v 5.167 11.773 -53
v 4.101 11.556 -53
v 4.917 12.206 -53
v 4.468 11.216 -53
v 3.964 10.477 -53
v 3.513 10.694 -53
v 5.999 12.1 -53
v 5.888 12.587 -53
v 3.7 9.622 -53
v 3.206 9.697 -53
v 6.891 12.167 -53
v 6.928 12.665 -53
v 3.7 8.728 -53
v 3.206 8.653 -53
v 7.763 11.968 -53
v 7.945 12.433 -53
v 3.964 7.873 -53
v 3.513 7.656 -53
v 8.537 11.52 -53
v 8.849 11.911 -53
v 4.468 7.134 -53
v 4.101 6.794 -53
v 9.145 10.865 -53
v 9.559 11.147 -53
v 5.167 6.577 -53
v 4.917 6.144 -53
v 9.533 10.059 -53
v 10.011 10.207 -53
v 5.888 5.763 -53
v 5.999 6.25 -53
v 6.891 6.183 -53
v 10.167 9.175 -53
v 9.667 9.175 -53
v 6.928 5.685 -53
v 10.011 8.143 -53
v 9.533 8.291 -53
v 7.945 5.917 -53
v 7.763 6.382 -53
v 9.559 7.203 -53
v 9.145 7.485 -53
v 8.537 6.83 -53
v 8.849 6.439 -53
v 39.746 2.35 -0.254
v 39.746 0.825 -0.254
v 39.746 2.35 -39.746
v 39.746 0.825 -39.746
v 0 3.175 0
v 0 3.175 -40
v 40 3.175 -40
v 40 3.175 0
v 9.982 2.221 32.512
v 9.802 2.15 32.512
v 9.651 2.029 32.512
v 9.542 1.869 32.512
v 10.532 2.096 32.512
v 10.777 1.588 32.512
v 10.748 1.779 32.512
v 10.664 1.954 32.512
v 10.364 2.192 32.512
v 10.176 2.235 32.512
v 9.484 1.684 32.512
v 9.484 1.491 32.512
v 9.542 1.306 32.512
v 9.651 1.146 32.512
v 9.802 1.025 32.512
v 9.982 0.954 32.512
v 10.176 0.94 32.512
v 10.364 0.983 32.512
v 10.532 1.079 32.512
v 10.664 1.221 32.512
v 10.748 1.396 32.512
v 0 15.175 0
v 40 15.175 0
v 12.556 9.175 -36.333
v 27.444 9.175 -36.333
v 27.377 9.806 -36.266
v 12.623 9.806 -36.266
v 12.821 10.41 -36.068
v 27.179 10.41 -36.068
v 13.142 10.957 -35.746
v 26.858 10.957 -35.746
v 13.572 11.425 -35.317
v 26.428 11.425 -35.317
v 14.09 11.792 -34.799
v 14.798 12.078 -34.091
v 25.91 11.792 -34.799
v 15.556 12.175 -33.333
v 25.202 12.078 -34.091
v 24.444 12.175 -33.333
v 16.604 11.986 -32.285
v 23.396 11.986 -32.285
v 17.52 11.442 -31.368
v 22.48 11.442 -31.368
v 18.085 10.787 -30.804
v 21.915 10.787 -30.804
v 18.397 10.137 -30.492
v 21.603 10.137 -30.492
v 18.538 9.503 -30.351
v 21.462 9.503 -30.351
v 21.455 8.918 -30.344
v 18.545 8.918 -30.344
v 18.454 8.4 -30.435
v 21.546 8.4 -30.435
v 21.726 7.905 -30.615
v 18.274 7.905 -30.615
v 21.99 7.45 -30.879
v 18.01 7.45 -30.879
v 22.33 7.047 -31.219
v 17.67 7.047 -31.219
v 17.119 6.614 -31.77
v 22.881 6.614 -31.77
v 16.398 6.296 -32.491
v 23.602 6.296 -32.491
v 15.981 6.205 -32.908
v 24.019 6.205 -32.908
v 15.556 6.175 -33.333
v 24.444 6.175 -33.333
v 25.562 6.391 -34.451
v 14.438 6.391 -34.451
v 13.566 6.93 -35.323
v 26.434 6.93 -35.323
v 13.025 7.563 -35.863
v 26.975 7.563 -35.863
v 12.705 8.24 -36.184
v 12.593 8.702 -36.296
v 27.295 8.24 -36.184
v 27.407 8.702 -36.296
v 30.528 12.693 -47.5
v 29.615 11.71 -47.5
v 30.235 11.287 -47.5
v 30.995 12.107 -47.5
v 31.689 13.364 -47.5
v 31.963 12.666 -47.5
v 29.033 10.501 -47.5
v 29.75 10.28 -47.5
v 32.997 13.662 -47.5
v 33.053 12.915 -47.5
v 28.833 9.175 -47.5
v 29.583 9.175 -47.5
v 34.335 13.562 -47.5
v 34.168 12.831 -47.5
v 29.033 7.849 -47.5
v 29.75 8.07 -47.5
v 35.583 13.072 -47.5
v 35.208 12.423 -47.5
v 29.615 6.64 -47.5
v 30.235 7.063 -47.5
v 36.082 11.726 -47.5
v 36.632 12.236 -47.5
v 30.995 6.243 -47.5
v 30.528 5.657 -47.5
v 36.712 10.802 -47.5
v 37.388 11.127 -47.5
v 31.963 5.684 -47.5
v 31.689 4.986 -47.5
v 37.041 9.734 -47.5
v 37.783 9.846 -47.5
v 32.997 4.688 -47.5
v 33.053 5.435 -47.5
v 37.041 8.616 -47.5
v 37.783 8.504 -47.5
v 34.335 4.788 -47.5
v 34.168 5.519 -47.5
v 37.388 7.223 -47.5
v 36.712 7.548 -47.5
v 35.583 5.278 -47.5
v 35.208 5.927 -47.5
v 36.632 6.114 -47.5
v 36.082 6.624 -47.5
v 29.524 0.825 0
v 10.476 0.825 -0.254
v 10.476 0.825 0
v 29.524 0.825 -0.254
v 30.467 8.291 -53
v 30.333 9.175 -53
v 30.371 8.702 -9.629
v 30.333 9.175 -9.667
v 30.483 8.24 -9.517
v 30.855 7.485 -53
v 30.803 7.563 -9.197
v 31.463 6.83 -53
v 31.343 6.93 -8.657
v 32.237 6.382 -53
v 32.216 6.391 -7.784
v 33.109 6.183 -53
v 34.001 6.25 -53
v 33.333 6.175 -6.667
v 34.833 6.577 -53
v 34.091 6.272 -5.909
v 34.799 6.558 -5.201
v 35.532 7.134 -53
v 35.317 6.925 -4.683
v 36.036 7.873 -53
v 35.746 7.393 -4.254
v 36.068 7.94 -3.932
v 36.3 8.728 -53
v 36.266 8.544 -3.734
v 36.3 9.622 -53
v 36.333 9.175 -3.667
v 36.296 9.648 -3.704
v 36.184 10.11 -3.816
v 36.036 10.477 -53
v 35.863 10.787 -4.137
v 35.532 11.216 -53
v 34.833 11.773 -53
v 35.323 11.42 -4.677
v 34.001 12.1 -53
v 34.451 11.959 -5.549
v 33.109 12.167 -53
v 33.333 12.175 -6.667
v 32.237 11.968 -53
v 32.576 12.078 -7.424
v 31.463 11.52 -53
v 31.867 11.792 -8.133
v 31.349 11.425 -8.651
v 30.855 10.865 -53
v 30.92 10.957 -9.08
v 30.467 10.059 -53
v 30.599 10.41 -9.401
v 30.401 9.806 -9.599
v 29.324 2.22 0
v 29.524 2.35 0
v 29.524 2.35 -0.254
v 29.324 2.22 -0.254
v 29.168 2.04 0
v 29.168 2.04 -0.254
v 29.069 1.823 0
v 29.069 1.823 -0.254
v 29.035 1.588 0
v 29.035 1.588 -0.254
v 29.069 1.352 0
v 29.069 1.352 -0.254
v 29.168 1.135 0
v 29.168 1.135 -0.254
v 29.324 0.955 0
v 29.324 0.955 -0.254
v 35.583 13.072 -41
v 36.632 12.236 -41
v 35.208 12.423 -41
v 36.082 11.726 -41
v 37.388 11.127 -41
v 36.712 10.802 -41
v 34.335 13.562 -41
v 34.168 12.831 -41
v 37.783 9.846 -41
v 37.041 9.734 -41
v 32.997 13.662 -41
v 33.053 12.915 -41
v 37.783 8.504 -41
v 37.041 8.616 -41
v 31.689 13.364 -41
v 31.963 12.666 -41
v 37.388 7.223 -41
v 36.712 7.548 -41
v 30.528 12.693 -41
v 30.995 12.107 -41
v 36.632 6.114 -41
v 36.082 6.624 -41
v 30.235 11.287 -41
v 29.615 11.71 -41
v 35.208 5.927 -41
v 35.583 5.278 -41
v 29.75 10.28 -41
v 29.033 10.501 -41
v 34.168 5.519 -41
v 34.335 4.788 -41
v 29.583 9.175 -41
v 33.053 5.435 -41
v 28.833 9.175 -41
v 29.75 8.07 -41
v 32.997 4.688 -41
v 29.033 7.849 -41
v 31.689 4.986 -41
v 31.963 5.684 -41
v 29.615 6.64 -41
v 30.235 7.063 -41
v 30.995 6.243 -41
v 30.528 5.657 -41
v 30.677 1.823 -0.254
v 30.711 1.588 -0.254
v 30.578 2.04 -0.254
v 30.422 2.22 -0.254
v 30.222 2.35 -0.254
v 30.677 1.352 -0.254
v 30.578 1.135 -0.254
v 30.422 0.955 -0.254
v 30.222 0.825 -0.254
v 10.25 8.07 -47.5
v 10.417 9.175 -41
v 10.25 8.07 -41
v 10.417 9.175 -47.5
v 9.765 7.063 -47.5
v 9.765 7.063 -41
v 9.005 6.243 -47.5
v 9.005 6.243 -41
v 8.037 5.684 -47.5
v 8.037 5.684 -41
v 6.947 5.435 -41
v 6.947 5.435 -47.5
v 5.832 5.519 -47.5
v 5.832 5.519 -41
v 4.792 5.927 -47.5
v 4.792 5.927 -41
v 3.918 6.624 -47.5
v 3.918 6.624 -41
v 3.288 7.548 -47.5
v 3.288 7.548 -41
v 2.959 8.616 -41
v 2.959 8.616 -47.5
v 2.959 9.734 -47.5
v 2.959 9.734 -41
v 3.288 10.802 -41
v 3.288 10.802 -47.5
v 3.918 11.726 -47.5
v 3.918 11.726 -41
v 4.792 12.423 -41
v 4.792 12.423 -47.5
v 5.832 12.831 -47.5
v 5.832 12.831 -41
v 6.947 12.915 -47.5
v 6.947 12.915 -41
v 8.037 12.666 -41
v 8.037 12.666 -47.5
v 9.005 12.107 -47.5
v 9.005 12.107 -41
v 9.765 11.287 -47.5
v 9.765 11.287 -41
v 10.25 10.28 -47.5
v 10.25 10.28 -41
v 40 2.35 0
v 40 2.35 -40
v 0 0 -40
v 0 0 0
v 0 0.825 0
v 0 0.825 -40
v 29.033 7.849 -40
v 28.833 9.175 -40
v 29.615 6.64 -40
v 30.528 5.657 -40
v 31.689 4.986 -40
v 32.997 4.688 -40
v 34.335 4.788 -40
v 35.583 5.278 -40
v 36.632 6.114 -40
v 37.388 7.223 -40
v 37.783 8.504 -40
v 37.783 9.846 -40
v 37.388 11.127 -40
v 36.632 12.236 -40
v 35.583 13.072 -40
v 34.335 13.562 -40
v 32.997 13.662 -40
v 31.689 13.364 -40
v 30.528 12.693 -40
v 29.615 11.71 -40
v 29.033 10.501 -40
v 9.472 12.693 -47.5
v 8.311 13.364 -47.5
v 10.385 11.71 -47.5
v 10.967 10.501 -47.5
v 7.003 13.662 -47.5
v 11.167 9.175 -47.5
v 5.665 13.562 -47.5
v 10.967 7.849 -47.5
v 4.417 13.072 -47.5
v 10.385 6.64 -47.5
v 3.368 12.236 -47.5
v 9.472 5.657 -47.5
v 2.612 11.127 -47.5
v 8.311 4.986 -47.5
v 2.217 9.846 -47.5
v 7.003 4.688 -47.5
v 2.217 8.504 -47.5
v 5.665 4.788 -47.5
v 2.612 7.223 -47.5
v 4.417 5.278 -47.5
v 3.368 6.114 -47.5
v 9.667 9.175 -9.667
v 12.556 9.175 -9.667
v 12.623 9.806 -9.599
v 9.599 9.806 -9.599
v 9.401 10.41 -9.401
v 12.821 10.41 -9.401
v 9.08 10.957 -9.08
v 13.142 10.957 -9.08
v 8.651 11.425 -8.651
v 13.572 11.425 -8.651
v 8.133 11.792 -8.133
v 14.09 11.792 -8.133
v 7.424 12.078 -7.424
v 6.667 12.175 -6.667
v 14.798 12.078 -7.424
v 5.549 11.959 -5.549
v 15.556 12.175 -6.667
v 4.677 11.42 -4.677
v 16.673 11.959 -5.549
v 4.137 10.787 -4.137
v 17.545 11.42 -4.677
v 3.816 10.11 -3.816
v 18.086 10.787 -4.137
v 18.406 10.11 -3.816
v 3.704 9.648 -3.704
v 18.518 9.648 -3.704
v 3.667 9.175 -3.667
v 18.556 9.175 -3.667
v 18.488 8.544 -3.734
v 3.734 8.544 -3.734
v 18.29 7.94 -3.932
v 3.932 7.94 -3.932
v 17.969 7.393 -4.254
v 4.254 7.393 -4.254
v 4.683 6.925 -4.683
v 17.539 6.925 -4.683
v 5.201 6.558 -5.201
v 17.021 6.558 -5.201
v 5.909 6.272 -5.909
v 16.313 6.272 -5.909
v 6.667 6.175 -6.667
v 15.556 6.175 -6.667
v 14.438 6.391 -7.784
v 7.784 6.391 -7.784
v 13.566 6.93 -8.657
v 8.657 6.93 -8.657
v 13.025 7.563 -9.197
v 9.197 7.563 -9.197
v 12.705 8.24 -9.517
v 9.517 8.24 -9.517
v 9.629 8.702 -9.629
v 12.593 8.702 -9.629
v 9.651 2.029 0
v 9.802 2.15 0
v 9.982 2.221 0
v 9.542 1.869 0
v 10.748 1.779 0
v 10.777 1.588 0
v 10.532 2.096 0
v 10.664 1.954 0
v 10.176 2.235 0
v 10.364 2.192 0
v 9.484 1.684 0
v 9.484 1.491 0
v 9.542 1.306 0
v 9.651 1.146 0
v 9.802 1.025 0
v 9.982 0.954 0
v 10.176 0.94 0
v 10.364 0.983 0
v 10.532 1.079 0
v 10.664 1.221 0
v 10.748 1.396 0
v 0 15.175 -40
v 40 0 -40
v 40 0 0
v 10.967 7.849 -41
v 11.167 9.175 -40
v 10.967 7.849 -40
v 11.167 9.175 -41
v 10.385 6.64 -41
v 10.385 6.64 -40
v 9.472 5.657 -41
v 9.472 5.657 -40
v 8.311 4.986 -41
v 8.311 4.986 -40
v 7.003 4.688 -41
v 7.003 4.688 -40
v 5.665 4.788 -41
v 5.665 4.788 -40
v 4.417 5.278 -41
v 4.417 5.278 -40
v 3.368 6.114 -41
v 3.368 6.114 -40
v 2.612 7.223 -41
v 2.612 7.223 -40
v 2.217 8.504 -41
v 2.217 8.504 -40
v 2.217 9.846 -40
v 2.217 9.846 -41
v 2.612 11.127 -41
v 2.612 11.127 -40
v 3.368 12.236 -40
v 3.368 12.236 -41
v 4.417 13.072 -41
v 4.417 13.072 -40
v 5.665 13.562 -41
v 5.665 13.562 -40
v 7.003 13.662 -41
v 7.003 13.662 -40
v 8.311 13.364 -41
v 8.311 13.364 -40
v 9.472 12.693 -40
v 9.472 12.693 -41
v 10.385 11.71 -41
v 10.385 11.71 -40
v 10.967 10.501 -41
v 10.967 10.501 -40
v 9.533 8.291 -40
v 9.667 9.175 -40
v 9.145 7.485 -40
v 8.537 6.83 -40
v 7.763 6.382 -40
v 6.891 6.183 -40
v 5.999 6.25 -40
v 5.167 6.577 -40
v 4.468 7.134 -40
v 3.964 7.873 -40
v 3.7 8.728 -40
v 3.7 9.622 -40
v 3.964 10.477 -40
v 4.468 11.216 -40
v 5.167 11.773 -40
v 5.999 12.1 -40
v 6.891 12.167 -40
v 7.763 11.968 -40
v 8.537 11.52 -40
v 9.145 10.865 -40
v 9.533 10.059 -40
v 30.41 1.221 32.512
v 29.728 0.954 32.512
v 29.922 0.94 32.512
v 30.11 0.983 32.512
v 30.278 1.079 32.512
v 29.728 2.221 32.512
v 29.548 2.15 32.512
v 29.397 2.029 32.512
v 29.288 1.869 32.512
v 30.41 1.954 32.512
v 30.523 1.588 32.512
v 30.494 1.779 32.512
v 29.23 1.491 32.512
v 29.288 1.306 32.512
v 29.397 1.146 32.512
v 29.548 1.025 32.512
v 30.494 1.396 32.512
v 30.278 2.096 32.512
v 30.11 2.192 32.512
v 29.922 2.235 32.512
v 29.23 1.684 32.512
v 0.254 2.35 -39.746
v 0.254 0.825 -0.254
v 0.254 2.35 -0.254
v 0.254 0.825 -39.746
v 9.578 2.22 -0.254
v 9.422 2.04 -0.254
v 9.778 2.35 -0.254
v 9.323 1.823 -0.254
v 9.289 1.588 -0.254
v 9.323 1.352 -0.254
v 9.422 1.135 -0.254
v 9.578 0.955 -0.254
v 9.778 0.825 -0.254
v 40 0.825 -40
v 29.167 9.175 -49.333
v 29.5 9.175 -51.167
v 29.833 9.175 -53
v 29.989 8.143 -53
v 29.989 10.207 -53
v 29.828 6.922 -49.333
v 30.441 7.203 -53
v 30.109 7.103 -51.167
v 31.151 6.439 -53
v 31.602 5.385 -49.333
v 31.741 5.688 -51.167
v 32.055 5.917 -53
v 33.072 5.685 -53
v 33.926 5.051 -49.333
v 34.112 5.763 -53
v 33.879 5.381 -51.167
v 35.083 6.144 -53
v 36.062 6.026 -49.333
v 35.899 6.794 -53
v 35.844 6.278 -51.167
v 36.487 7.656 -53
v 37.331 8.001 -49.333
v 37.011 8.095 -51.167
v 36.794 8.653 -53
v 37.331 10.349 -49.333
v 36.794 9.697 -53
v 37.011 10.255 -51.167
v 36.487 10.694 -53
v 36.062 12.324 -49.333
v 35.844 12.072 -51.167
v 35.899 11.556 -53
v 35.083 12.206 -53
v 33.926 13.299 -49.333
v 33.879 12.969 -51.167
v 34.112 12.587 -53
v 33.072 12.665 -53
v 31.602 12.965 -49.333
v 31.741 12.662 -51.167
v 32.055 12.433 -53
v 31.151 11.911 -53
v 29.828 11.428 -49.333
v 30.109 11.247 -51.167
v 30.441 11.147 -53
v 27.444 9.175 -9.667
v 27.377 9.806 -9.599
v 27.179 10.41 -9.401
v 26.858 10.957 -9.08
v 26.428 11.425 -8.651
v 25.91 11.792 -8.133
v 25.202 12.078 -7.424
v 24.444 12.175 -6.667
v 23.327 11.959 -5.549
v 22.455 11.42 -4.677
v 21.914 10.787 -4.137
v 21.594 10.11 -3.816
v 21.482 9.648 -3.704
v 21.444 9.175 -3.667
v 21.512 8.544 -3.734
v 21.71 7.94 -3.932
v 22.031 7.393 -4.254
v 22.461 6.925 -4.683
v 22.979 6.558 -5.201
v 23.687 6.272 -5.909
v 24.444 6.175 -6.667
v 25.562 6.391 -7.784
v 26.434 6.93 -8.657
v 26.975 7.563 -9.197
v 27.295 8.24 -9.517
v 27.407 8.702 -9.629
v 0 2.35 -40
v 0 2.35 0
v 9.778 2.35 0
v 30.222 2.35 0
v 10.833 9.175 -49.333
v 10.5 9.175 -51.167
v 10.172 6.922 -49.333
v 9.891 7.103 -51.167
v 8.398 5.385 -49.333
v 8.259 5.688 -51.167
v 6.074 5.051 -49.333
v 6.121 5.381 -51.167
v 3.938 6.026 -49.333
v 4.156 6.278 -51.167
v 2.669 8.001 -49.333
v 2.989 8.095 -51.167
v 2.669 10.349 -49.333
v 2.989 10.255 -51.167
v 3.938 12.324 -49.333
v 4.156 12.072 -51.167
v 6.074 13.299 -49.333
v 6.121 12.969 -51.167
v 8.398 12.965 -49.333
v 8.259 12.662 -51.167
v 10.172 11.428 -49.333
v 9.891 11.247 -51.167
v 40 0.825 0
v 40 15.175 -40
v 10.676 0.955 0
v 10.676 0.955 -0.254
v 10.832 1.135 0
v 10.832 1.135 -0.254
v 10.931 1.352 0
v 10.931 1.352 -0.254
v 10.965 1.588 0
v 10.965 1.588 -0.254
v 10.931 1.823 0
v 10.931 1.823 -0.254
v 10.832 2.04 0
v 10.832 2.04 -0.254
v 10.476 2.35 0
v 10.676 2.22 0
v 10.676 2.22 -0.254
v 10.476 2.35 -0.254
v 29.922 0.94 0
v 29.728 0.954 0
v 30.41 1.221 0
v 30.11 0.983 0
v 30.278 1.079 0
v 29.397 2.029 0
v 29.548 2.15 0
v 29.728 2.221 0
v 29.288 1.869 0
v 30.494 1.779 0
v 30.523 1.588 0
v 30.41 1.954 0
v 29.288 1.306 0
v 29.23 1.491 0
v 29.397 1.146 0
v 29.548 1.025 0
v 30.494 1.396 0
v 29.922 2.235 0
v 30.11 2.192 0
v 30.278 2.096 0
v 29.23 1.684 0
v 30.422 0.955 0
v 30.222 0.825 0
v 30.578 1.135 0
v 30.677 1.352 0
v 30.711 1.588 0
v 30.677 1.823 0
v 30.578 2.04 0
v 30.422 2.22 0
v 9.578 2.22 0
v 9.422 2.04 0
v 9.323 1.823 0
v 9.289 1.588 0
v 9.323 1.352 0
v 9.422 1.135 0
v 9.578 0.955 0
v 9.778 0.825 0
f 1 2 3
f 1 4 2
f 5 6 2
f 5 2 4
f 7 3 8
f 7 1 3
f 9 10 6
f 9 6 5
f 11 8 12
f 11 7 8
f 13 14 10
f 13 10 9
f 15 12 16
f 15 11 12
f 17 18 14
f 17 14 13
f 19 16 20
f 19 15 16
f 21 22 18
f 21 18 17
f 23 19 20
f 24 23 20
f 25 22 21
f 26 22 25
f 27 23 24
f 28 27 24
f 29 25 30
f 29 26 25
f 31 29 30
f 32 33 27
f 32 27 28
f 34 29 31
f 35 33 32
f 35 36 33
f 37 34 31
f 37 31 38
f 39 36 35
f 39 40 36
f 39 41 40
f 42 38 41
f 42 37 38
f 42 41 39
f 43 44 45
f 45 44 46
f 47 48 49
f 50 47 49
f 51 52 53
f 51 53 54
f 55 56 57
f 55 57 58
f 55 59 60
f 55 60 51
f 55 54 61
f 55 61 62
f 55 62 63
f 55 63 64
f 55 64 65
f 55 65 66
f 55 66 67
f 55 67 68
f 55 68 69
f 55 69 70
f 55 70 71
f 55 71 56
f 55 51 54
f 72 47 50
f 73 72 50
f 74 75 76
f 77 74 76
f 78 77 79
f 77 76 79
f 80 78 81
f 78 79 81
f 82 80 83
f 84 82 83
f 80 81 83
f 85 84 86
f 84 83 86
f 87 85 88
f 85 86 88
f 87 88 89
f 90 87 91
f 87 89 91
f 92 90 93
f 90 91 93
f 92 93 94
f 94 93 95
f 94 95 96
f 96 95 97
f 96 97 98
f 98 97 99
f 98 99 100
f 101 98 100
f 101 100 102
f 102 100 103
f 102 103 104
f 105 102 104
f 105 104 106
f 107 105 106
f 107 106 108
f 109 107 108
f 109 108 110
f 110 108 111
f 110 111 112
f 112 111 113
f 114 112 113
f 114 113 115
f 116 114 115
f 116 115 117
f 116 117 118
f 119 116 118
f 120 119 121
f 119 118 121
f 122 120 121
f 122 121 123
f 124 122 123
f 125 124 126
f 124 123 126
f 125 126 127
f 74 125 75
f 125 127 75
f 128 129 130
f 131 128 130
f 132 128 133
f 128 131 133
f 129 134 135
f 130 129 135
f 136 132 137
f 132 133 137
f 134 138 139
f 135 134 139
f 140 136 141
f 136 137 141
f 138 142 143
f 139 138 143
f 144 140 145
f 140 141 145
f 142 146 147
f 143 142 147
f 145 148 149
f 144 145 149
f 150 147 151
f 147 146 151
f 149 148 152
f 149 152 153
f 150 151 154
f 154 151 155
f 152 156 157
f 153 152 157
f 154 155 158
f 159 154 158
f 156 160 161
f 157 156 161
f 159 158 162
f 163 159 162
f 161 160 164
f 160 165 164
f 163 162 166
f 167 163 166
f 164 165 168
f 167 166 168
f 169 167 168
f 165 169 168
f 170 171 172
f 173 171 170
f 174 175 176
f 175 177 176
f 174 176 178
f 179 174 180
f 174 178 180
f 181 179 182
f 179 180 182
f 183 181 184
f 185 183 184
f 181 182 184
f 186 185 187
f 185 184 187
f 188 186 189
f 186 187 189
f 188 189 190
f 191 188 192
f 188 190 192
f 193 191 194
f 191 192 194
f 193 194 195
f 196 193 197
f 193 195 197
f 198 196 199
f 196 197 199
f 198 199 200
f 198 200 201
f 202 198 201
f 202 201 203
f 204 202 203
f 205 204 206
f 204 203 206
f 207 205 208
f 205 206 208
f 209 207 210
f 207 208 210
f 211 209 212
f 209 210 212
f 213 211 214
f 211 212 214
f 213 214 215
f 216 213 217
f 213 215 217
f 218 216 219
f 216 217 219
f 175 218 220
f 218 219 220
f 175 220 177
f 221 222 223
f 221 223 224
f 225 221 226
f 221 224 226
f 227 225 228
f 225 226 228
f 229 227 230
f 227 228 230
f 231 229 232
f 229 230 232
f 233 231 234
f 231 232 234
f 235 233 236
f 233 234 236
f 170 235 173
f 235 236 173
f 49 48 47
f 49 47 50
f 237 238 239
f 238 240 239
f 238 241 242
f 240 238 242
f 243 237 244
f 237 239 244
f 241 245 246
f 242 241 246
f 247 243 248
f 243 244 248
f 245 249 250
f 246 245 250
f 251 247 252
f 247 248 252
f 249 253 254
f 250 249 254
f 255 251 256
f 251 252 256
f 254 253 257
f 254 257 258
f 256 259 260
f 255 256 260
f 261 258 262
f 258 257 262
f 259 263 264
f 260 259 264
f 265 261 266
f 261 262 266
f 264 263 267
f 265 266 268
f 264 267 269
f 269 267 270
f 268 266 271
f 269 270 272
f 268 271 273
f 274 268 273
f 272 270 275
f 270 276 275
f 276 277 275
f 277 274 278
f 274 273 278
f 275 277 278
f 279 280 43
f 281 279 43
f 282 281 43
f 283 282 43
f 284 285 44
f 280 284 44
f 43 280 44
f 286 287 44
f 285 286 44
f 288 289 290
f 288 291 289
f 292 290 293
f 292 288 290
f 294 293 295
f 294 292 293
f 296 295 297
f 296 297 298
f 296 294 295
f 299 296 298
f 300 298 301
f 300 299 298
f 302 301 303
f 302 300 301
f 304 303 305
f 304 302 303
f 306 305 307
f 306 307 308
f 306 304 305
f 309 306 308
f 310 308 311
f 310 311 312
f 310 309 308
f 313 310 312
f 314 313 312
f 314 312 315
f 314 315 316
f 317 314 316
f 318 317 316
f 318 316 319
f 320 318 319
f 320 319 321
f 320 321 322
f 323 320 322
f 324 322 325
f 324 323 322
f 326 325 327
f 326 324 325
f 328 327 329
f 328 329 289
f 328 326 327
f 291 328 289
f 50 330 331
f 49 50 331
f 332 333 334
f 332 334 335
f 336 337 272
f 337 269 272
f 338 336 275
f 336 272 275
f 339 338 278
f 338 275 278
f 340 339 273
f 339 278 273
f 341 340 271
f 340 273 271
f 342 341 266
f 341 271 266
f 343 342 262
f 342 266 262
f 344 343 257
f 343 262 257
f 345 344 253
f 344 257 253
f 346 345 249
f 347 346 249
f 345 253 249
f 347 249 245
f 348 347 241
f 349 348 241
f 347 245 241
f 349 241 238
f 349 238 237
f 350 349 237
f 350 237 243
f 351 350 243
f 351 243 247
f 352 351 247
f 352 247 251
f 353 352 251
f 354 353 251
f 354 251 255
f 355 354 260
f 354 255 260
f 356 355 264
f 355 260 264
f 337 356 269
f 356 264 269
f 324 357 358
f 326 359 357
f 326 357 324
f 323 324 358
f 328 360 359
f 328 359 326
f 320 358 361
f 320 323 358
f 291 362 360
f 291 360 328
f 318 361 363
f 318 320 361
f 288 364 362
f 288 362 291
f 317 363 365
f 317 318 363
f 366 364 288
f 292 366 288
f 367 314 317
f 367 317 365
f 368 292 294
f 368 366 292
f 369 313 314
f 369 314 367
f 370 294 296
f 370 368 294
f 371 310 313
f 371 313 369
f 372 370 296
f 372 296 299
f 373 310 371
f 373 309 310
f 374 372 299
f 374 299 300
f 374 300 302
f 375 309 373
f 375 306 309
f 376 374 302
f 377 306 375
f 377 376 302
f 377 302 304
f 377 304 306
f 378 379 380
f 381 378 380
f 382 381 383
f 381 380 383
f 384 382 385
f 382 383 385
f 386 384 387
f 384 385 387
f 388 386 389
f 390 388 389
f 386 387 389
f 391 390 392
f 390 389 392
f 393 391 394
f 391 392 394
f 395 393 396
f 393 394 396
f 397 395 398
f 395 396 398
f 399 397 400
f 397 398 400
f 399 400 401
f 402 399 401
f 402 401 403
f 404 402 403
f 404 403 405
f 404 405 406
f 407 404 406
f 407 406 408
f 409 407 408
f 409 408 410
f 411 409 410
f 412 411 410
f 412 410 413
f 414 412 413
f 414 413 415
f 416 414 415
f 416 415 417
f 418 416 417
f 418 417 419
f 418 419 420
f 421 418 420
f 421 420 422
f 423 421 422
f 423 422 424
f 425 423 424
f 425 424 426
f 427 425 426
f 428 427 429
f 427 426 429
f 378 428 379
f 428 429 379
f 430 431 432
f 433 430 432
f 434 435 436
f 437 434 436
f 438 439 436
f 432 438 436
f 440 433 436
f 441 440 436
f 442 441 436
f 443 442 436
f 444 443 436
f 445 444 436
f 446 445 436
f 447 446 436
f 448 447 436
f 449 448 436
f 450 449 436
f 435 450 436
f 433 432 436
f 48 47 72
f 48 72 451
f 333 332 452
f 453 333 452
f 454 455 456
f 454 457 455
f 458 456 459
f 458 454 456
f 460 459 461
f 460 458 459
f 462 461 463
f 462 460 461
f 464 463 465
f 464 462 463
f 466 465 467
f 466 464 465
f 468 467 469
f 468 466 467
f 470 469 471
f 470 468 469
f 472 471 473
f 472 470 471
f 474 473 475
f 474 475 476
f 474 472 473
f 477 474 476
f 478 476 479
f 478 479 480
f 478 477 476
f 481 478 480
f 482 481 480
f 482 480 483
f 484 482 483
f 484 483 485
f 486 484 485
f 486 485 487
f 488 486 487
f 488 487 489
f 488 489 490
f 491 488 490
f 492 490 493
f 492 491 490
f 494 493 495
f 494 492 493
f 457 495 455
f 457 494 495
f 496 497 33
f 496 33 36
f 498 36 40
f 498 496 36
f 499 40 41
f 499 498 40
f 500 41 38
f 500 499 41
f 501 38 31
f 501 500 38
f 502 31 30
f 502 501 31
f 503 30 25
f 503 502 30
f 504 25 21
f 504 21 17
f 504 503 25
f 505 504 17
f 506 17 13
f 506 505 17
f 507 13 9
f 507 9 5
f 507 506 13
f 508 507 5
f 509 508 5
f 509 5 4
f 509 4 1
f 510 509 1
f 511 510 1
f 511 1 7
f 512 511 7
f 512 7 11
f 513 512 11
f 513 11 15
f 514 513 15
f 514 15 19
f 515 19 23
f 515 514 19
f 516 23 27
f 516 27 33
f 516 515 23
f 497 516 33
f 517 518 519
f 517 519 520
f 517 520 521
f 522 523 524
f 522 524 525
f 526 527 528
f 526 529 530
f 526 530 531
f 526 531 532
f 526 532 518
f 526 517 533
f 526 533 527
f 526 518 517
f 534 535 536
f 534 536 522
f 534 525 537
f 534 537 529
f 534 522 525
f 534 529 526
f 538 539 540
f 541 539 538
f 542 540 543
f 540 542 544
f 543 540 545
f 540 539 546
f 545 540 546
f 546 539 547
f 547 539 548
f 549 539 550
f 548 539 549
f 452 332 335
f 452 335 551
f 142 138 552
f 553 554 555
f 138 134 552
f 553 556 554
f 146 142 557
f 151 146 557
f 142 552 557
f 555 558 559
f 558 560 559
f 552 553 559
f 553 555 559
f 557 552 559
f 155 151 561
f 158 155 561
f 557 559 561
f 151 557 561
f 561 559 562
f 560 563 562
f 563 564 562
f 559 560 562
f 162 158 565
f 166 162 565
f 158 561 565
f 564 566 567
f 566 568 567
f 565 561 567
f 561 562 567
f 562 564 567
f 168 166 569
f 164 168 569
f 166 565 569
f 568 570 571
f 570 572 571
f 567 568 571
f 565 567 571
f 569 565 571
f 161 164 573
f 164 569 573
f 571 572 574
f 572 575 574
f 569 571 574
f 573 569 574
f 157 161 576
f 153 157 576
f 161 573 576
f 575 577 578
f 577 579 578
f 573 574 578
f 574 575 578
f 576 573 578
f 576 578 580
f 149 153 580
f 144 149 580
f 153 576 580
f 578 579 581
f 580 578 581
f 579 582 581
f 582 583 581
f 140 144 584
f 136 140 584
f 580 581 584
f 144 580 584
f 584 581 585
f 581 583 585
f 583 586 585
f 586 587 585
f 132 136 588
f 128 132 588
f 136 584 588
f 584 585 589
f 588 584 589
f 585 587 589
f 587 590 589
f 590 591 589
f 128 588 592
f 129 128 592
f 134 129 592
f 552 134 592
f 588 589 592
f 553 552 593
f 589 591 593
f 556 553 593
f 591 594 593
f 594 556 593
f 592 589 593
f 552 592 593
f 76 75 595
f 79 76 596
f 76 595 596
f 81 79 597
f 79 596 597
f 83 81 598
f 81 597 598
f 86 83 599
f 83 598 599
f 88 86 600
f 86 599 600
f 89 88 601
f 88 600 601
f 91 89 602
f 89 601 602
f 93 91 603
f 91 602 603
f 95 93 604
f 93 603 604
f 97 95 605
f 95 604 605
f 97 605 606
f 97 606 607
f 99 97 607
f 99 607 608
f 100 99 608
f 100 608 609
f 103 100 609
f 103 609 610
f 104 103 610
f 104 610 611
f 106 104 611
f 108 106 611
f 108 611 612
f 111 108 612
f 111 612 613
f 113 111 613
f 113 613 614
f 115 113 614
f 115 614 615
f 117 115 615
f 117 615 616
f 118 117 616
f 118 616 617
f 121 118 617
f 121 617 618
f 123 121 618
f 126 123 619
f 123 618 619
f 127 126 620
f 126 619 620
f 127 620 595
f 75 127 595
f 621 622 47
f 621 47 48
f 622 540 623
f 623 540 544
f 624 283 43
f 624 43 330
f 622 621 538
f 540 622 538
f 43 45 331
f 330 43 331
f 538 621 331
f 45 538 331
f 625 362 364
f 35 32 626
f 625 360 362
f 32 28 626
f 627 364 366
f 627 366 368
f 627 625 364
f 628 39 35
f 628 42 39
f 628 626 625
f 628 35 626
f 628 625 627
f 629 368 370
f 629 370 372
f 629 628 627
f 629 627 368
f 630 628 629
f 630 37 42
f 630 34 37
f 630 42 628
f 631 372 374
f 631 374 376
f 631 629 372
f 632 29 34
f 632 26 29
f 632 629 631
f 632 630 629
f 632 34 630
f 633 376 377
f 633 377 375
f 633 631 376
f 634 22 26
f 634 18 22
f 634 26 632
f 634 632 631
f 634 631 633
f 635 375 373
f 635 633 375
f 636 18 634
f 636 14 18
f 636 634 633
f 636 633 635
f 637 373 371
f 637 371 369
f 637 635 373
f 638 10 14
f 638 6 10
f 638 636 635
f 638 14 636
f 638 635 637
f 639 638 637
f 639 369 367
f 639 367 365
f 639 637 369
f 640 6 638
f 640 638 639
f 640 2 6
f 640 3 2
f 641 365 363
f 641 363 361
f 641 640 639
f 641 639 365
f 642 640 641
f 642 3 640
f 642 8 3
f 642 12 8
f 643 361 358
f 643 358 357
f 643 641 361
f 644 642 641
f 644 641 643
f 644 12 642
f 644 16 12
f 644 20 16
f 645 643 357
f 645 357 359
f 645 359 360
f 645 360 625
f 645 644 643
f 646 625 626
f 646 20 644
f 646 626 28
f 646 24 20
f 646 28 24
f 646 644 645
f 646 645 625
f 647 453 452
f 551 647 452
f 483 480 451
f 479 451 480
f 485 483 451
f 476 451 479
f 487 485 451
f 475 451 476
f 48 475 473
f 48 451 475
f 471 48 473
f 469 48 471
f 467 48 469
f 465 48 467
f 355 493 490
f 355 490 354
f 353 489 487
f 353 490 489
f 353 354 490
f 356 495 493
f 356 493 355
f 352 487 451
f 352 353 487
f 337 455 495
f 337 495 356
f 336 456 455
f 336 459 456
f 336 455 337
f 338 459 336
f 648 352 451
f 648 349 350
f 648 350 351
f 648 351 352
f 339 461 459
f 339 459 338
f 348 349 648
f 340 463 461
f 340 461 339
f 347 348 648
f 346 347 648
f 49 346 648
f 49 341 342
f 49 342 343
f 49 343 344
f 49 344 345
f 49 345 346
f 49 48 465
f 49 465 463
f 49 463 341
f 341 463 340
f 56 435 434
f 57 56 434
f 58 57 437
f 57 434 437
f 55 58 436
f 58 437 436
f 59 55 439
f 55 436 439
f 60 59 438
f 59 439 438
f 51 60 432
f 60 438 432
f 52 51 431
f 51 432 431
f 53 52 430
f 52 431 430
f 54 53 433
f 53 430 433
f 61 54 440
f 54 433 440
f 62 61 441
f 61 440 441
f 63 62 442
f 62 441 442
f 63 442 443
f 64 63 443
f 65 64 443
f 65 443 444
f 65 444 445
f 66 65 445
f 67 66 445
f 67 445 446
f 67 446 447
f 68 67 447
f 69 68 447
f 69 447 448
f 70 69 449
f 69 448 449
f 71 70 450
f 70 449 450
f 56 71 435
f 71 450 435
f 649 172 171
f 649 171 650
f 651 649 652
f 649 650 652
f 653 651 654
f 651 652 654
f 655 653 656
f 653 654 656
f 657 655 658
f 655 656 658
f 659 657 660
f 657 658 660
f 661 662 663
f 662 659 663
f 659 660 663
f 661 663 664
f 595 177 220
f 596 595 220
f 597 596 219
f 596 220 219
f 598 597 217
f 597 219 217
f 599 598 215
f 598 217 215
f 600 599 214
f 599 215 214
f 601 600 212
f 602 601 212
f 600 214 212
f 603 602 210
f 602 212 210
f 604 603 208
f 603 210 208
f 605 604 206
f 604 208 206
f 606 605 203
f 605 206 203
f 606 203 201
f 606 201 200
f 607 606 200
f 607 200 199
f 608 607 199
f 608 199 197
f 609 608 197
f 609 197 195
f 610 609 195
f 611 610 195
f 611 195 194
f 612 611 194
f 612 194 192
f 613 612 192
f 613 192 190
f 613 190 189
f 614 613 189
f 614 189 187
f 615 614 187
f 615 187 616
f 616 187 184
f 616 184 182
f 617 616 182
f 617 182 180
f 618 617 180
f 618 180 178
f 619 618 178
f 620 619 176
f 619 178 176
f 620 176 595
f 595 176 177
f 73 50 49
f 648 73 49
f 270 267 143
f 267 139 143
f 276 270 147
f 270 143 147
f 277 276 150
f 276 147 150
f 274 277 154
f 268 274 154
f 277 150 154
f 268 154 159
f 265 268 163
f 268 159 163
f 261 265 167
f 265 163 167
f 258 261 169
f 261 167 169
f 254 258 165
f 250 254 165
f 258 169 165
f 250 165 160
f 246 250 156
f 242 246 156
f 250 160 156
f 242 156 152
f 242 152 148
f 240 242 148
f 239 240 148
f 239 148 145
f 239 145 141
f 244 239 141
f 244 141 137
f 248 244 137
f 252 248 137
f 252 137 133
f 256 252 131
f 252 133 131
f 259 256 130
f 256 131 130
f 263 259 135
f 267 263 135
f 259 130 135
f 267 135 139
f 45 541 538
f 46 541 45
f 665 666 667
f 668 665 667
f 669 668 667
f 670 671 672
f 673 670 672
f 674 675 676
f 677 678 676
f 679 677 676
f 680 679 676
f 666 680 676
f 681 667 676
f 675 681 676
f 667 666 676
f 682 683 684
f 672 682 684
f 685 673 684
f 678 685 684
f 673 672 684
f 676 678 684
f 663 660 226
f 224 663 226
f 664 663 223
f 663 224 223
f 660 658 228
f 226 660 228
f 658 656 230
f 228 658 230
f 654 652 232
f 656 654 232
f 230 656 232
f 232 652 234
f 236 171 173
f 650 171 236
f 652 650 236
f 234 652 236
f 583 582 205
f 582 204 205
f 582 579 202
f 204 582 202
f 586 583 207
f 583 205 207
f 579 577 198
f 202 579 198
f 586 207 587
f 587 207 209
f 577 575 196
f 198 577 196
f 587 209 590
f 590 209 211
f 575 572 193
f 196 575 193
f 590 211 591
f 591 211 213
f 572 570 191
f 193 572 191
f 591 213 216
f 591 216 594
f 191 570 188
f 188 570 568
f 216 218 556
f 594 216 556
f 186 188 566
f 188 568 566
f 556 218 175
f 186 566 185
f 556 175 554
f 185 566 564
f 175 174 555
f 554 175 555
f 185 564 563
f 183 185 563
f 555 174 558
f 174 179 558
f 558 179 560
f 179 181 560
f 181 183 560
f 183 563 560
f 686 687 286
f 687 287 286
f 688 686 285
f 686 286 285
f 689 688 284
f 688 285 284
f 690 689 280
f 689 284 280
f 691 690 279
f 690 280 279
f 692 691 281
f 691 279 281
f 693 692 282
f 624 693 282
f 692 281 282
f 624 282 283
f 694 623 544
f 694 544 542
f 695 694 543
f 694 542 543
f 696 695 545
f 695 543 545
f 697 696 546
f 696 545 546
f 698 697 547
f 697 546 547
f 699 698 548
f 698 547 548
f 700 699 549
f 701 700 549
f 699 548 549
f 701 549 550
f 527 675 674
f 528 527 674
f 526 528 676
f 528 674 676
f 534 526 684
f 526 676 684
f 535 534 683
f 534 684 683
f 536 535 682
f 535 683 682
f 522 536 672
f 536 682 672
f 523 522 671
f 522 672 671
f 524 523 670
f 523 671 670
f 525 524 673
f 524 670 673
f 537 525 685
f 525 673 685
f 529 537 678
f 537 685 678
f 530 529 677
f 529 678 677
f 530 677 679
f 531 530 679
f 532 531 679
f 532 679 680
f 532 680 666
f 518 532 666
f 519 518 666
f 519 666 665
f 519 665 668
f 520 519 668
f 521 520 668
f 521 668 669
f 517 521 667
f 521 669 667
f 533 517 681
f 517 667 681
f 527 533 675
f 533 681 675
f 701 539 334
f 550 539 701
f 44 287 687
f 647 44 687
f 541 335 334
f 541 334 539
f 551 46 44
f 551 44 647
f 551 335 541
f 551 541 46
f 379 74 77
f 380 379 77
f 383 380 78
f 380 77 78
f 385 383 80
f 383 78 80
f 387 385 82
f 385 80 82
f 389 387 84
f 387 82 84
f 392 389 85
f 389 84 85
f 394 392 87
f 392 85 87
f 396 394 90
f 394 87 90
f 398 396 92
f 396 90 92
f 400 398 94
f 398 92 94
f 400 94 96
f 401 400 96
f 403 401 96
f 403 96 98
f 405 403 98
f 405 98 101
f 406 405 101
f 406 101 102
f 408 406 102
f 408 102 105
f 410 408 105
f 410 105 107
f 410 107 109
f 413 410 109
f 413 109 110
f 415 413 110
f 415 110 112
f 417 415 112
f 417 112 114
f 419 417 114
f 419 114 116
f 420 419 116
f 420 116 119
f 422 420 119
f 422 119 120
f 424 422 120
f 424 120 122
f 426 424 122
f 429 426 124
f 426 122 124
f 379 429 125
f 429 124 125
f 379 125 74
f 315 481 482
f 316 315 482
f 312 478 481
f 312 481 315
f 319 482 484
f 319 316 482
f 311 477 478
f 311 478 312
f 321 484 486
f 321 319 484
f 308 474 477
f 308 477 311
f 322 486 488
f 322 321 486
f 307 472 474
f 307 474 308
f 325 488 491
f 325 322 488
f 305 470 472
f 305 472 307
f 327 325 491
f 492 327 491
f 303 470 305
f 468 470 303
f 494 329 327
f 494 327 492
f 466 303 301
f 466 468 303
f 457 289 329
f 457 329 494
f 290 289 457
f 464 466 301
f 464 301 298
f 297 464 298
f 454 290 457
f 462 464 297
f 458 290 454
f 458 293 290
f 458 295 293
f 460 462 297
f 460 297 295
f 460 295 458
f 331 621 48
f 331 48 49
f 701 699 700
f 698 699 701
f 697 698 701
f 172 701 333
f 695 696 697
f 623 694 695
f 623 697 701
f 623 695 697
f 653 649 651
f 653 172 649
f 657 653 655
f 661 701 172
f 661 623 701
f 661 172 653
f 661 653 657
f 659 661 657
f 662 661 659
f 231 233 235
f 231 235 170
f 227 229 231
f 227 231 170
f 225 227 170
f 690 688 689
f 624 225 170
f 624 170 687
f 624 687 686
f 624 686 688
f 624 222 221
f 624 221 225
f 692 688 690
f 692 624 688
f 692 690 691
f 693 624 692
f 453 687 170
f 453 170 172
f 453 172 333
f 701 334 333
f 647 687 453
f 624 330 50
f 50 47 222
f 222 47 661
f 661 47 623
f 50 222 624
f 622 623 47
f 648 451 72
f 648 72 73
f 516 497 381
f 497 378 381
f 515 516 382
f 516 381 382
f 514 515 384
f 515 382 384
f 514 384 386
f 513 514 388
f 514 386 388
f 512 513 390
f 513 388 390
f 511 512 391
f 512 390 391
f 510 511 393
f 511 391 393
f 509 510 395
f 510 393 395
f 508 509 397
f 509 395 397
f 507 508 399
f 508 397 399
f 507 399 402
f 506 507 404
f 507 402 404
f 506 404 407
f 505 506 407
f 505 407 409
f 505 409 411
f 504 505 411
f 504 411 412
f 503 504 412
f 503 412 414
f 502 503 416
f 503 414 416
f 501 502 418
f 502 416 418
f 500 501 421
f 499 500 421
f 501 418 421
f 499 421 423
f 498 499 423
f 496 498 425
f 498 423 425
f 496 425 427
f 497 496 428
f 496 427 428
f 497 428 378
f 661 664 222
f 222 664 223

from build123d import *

# Parameters (mm, degrees)
SKETCH1_W               = 40
SKETCH1_H               = 40
BOSS_EXTRUDE1_DEPTH     = 3.175
CUT_EXTRUDE1_DEPTH      = 0.762
CUT_EXTRUDE1_DEPTH_BACK = 0.762
SKETCH2_W               = 40
SKETCH2_H               = 40
SKETCH2_W_2             = 39.492
SKETCH2_H_2             = 39.492
SKETCH3_R               = 0.838059787
BOSS_EXTRUDE2_DEPTH     = 0.254
SKETCH4_R               = 0.649805147
BOSS_EXTRUDE3_DEPTH     = 32.512
BOSS_EXTRUDE3_2_DEPTH   = 32.512
SKETCH5_W               = 40
SKETCH5_H               = 40
BOSS_EXTRUDE4_DEPTH     = 12
CUT_SWEEP1_PROFILE_R    = 3
SKETCH16_W              = 0.75
SKETCH16_H              = 6.5


with BuildPart() as part:
    # Sketch1 → Boss-Extrude1 (new body)
    with BuildSketch(Plane(origin=(0, 0, 0), x_dir=(1, 0, 0), z_dir=(0, 1, 0))):
        with Locations((20, 20)):
            Rectangle(SKETCH1_W, SKETCH1_H)
    extrude(amount=BOSS_EXTRUDE1_DEPTH)

    # Sketch2 → Cut-Extrude1 (cut, two sides: drawn at the far end of the back side and taken through both)
    with BuildSketch(Plane(origin=(0, 1.5875, 0), x_dir=(1, 0, 0), z_dir=(0, 1, 0)).offset(-CUT_EXTRUDE1_DEPTH_BACK)):
        with Locations((20, 20)):
            Rectangle(SKETCH2_W, SKETCH2_H)
        with Locations((20, 20)):
            Rectangle(SKETCH2_W_2, SKETCH2_H_2, mode=Mode.SUBTRACT)
    extrude(amount=CUT_EXTRUDE1_DEPTH + CUT_EXTRUDE1_DEPTH_BACK, mode=Mode.SUBTRACT)

    # Sketch3 → Boss-Extrude2 (add)
    with BuildSketch(Plane.XY.offset(-0.254)):
        with Locations((10.127, 1.5875)):
            Circle(SKETCH3_R)
        with Locations((29.873, 1.5875)):
            Circle(SKETCH3_R)
    extrude(amount=BOSS_EXTRUDE2_DEPTH)


with BuildPart() as body_2:
    # Sketch4 → Boss-Extrude3 (new body)
    with BuildSketch(Plane.XY):
        with Locations((10.127, 1.5875)):
            Circle(SKETCH4_R)
    extrude(amount=BOSS_EXTRUDE3_DEPTH)


with BuildPart() as body_3:
    # Sketch4 → Boss-Extrude3 2 (new body)
    with BuildSketch(Plane.XY):
        with Locations((29.873, 1.5875)):
            Circle(SKETCH4_R)
    extrude(amount=BOSS_EXTRUDE3_2_DEPTH)


with BuildPart() as body_4:
    # Sketch5 → Boss-Extrude4 (new body)
    with BuildSketch(Plane(origin=(0, 3.175, 0), x_dir=(1, 0, 0), z_dir=(0, 1, 0))):
        with Locations((20, 20)):
            Rectangle(SKETCH5_W, SKETCH5_H)
    extrude(amount=BOSS_EXTRUDE4_DEPTH)

    # Cut-Sweep1: sweep along a path in Sketch7
    with BuildLine(Plane(origin=(0, 9.175000062, 0), x_dir=(1, 0, 0), z_dir=(0, 1, 0))) as cut_sweep1_path:
        Line((6.666666667, 40), (6.666666667, 6.666666667))
        Line((6.666666667, 6.666666667), (15.555555559, 6.666666667))
        Line((15.555555559, 6.666666667), (15.555555559, 33.333333333))
        Line((15.555555559, 33.333333333), (24.444444441, 33.333333333))
        Line((24.444444441, 33.333333333), (24.444444441, 6.666666667))
        Line((24.444444441, 6.666666667), (33.333333333, 6.666666667))
        Line((33.333333333, 6.666666667), (33.333333333, 40))
    # Cut-Sweep1 profile (on start of the path) → Cut-Sweep1 (sweep, cut)
    with BuildSketch(Plane(origin=(6.666666667, 9.175000062, -40), x_dir=(1, 0, 0), z_dir=(0, 0, 1))):
        Circle(CUT_SWEEP1_PROFILE_R)
    sweep(path=cut_sweep1_path.line, transition=Transition.RIGHT, mode=Mode.SUBTRACT)

    # Sketch16 → Revolve1 (revolve)
    with BuildSketch(Plane(origin=(0, 9.175000062, 0), x_dir=(1, 0, 0), z_dir=(0, 1, 0))):
        Polygon((9.666666667, 53), (9.666666667, 47.5), (10.416666667, 47.5), (11.166666667, 47.5), (10.166666667, 53), align=None)
        with Locations((10.041666667, 44.25)):
            Rectangle(SKETCH16_W, SKETCH16_H)
        Polygon((9.666666667, 41), (9.666666667, 40), (11.166666667, 40), (11.166666667, 41), (10.416666667, 41), align=None)
    revolve1 = revolve(axis=Axis((6.666666667, 9.175000062, -40), (0, 0, -1)))

    # Mirror1: Revolve1 across plane
    add(revolve1.mirror(Plane(origin=(20, 0, 0), x_dir=(0, 0, 1), z_dir=(1, 0, 0))))


solid = Compound([part.part, body_2.part, body_3.part, body_4.part])
